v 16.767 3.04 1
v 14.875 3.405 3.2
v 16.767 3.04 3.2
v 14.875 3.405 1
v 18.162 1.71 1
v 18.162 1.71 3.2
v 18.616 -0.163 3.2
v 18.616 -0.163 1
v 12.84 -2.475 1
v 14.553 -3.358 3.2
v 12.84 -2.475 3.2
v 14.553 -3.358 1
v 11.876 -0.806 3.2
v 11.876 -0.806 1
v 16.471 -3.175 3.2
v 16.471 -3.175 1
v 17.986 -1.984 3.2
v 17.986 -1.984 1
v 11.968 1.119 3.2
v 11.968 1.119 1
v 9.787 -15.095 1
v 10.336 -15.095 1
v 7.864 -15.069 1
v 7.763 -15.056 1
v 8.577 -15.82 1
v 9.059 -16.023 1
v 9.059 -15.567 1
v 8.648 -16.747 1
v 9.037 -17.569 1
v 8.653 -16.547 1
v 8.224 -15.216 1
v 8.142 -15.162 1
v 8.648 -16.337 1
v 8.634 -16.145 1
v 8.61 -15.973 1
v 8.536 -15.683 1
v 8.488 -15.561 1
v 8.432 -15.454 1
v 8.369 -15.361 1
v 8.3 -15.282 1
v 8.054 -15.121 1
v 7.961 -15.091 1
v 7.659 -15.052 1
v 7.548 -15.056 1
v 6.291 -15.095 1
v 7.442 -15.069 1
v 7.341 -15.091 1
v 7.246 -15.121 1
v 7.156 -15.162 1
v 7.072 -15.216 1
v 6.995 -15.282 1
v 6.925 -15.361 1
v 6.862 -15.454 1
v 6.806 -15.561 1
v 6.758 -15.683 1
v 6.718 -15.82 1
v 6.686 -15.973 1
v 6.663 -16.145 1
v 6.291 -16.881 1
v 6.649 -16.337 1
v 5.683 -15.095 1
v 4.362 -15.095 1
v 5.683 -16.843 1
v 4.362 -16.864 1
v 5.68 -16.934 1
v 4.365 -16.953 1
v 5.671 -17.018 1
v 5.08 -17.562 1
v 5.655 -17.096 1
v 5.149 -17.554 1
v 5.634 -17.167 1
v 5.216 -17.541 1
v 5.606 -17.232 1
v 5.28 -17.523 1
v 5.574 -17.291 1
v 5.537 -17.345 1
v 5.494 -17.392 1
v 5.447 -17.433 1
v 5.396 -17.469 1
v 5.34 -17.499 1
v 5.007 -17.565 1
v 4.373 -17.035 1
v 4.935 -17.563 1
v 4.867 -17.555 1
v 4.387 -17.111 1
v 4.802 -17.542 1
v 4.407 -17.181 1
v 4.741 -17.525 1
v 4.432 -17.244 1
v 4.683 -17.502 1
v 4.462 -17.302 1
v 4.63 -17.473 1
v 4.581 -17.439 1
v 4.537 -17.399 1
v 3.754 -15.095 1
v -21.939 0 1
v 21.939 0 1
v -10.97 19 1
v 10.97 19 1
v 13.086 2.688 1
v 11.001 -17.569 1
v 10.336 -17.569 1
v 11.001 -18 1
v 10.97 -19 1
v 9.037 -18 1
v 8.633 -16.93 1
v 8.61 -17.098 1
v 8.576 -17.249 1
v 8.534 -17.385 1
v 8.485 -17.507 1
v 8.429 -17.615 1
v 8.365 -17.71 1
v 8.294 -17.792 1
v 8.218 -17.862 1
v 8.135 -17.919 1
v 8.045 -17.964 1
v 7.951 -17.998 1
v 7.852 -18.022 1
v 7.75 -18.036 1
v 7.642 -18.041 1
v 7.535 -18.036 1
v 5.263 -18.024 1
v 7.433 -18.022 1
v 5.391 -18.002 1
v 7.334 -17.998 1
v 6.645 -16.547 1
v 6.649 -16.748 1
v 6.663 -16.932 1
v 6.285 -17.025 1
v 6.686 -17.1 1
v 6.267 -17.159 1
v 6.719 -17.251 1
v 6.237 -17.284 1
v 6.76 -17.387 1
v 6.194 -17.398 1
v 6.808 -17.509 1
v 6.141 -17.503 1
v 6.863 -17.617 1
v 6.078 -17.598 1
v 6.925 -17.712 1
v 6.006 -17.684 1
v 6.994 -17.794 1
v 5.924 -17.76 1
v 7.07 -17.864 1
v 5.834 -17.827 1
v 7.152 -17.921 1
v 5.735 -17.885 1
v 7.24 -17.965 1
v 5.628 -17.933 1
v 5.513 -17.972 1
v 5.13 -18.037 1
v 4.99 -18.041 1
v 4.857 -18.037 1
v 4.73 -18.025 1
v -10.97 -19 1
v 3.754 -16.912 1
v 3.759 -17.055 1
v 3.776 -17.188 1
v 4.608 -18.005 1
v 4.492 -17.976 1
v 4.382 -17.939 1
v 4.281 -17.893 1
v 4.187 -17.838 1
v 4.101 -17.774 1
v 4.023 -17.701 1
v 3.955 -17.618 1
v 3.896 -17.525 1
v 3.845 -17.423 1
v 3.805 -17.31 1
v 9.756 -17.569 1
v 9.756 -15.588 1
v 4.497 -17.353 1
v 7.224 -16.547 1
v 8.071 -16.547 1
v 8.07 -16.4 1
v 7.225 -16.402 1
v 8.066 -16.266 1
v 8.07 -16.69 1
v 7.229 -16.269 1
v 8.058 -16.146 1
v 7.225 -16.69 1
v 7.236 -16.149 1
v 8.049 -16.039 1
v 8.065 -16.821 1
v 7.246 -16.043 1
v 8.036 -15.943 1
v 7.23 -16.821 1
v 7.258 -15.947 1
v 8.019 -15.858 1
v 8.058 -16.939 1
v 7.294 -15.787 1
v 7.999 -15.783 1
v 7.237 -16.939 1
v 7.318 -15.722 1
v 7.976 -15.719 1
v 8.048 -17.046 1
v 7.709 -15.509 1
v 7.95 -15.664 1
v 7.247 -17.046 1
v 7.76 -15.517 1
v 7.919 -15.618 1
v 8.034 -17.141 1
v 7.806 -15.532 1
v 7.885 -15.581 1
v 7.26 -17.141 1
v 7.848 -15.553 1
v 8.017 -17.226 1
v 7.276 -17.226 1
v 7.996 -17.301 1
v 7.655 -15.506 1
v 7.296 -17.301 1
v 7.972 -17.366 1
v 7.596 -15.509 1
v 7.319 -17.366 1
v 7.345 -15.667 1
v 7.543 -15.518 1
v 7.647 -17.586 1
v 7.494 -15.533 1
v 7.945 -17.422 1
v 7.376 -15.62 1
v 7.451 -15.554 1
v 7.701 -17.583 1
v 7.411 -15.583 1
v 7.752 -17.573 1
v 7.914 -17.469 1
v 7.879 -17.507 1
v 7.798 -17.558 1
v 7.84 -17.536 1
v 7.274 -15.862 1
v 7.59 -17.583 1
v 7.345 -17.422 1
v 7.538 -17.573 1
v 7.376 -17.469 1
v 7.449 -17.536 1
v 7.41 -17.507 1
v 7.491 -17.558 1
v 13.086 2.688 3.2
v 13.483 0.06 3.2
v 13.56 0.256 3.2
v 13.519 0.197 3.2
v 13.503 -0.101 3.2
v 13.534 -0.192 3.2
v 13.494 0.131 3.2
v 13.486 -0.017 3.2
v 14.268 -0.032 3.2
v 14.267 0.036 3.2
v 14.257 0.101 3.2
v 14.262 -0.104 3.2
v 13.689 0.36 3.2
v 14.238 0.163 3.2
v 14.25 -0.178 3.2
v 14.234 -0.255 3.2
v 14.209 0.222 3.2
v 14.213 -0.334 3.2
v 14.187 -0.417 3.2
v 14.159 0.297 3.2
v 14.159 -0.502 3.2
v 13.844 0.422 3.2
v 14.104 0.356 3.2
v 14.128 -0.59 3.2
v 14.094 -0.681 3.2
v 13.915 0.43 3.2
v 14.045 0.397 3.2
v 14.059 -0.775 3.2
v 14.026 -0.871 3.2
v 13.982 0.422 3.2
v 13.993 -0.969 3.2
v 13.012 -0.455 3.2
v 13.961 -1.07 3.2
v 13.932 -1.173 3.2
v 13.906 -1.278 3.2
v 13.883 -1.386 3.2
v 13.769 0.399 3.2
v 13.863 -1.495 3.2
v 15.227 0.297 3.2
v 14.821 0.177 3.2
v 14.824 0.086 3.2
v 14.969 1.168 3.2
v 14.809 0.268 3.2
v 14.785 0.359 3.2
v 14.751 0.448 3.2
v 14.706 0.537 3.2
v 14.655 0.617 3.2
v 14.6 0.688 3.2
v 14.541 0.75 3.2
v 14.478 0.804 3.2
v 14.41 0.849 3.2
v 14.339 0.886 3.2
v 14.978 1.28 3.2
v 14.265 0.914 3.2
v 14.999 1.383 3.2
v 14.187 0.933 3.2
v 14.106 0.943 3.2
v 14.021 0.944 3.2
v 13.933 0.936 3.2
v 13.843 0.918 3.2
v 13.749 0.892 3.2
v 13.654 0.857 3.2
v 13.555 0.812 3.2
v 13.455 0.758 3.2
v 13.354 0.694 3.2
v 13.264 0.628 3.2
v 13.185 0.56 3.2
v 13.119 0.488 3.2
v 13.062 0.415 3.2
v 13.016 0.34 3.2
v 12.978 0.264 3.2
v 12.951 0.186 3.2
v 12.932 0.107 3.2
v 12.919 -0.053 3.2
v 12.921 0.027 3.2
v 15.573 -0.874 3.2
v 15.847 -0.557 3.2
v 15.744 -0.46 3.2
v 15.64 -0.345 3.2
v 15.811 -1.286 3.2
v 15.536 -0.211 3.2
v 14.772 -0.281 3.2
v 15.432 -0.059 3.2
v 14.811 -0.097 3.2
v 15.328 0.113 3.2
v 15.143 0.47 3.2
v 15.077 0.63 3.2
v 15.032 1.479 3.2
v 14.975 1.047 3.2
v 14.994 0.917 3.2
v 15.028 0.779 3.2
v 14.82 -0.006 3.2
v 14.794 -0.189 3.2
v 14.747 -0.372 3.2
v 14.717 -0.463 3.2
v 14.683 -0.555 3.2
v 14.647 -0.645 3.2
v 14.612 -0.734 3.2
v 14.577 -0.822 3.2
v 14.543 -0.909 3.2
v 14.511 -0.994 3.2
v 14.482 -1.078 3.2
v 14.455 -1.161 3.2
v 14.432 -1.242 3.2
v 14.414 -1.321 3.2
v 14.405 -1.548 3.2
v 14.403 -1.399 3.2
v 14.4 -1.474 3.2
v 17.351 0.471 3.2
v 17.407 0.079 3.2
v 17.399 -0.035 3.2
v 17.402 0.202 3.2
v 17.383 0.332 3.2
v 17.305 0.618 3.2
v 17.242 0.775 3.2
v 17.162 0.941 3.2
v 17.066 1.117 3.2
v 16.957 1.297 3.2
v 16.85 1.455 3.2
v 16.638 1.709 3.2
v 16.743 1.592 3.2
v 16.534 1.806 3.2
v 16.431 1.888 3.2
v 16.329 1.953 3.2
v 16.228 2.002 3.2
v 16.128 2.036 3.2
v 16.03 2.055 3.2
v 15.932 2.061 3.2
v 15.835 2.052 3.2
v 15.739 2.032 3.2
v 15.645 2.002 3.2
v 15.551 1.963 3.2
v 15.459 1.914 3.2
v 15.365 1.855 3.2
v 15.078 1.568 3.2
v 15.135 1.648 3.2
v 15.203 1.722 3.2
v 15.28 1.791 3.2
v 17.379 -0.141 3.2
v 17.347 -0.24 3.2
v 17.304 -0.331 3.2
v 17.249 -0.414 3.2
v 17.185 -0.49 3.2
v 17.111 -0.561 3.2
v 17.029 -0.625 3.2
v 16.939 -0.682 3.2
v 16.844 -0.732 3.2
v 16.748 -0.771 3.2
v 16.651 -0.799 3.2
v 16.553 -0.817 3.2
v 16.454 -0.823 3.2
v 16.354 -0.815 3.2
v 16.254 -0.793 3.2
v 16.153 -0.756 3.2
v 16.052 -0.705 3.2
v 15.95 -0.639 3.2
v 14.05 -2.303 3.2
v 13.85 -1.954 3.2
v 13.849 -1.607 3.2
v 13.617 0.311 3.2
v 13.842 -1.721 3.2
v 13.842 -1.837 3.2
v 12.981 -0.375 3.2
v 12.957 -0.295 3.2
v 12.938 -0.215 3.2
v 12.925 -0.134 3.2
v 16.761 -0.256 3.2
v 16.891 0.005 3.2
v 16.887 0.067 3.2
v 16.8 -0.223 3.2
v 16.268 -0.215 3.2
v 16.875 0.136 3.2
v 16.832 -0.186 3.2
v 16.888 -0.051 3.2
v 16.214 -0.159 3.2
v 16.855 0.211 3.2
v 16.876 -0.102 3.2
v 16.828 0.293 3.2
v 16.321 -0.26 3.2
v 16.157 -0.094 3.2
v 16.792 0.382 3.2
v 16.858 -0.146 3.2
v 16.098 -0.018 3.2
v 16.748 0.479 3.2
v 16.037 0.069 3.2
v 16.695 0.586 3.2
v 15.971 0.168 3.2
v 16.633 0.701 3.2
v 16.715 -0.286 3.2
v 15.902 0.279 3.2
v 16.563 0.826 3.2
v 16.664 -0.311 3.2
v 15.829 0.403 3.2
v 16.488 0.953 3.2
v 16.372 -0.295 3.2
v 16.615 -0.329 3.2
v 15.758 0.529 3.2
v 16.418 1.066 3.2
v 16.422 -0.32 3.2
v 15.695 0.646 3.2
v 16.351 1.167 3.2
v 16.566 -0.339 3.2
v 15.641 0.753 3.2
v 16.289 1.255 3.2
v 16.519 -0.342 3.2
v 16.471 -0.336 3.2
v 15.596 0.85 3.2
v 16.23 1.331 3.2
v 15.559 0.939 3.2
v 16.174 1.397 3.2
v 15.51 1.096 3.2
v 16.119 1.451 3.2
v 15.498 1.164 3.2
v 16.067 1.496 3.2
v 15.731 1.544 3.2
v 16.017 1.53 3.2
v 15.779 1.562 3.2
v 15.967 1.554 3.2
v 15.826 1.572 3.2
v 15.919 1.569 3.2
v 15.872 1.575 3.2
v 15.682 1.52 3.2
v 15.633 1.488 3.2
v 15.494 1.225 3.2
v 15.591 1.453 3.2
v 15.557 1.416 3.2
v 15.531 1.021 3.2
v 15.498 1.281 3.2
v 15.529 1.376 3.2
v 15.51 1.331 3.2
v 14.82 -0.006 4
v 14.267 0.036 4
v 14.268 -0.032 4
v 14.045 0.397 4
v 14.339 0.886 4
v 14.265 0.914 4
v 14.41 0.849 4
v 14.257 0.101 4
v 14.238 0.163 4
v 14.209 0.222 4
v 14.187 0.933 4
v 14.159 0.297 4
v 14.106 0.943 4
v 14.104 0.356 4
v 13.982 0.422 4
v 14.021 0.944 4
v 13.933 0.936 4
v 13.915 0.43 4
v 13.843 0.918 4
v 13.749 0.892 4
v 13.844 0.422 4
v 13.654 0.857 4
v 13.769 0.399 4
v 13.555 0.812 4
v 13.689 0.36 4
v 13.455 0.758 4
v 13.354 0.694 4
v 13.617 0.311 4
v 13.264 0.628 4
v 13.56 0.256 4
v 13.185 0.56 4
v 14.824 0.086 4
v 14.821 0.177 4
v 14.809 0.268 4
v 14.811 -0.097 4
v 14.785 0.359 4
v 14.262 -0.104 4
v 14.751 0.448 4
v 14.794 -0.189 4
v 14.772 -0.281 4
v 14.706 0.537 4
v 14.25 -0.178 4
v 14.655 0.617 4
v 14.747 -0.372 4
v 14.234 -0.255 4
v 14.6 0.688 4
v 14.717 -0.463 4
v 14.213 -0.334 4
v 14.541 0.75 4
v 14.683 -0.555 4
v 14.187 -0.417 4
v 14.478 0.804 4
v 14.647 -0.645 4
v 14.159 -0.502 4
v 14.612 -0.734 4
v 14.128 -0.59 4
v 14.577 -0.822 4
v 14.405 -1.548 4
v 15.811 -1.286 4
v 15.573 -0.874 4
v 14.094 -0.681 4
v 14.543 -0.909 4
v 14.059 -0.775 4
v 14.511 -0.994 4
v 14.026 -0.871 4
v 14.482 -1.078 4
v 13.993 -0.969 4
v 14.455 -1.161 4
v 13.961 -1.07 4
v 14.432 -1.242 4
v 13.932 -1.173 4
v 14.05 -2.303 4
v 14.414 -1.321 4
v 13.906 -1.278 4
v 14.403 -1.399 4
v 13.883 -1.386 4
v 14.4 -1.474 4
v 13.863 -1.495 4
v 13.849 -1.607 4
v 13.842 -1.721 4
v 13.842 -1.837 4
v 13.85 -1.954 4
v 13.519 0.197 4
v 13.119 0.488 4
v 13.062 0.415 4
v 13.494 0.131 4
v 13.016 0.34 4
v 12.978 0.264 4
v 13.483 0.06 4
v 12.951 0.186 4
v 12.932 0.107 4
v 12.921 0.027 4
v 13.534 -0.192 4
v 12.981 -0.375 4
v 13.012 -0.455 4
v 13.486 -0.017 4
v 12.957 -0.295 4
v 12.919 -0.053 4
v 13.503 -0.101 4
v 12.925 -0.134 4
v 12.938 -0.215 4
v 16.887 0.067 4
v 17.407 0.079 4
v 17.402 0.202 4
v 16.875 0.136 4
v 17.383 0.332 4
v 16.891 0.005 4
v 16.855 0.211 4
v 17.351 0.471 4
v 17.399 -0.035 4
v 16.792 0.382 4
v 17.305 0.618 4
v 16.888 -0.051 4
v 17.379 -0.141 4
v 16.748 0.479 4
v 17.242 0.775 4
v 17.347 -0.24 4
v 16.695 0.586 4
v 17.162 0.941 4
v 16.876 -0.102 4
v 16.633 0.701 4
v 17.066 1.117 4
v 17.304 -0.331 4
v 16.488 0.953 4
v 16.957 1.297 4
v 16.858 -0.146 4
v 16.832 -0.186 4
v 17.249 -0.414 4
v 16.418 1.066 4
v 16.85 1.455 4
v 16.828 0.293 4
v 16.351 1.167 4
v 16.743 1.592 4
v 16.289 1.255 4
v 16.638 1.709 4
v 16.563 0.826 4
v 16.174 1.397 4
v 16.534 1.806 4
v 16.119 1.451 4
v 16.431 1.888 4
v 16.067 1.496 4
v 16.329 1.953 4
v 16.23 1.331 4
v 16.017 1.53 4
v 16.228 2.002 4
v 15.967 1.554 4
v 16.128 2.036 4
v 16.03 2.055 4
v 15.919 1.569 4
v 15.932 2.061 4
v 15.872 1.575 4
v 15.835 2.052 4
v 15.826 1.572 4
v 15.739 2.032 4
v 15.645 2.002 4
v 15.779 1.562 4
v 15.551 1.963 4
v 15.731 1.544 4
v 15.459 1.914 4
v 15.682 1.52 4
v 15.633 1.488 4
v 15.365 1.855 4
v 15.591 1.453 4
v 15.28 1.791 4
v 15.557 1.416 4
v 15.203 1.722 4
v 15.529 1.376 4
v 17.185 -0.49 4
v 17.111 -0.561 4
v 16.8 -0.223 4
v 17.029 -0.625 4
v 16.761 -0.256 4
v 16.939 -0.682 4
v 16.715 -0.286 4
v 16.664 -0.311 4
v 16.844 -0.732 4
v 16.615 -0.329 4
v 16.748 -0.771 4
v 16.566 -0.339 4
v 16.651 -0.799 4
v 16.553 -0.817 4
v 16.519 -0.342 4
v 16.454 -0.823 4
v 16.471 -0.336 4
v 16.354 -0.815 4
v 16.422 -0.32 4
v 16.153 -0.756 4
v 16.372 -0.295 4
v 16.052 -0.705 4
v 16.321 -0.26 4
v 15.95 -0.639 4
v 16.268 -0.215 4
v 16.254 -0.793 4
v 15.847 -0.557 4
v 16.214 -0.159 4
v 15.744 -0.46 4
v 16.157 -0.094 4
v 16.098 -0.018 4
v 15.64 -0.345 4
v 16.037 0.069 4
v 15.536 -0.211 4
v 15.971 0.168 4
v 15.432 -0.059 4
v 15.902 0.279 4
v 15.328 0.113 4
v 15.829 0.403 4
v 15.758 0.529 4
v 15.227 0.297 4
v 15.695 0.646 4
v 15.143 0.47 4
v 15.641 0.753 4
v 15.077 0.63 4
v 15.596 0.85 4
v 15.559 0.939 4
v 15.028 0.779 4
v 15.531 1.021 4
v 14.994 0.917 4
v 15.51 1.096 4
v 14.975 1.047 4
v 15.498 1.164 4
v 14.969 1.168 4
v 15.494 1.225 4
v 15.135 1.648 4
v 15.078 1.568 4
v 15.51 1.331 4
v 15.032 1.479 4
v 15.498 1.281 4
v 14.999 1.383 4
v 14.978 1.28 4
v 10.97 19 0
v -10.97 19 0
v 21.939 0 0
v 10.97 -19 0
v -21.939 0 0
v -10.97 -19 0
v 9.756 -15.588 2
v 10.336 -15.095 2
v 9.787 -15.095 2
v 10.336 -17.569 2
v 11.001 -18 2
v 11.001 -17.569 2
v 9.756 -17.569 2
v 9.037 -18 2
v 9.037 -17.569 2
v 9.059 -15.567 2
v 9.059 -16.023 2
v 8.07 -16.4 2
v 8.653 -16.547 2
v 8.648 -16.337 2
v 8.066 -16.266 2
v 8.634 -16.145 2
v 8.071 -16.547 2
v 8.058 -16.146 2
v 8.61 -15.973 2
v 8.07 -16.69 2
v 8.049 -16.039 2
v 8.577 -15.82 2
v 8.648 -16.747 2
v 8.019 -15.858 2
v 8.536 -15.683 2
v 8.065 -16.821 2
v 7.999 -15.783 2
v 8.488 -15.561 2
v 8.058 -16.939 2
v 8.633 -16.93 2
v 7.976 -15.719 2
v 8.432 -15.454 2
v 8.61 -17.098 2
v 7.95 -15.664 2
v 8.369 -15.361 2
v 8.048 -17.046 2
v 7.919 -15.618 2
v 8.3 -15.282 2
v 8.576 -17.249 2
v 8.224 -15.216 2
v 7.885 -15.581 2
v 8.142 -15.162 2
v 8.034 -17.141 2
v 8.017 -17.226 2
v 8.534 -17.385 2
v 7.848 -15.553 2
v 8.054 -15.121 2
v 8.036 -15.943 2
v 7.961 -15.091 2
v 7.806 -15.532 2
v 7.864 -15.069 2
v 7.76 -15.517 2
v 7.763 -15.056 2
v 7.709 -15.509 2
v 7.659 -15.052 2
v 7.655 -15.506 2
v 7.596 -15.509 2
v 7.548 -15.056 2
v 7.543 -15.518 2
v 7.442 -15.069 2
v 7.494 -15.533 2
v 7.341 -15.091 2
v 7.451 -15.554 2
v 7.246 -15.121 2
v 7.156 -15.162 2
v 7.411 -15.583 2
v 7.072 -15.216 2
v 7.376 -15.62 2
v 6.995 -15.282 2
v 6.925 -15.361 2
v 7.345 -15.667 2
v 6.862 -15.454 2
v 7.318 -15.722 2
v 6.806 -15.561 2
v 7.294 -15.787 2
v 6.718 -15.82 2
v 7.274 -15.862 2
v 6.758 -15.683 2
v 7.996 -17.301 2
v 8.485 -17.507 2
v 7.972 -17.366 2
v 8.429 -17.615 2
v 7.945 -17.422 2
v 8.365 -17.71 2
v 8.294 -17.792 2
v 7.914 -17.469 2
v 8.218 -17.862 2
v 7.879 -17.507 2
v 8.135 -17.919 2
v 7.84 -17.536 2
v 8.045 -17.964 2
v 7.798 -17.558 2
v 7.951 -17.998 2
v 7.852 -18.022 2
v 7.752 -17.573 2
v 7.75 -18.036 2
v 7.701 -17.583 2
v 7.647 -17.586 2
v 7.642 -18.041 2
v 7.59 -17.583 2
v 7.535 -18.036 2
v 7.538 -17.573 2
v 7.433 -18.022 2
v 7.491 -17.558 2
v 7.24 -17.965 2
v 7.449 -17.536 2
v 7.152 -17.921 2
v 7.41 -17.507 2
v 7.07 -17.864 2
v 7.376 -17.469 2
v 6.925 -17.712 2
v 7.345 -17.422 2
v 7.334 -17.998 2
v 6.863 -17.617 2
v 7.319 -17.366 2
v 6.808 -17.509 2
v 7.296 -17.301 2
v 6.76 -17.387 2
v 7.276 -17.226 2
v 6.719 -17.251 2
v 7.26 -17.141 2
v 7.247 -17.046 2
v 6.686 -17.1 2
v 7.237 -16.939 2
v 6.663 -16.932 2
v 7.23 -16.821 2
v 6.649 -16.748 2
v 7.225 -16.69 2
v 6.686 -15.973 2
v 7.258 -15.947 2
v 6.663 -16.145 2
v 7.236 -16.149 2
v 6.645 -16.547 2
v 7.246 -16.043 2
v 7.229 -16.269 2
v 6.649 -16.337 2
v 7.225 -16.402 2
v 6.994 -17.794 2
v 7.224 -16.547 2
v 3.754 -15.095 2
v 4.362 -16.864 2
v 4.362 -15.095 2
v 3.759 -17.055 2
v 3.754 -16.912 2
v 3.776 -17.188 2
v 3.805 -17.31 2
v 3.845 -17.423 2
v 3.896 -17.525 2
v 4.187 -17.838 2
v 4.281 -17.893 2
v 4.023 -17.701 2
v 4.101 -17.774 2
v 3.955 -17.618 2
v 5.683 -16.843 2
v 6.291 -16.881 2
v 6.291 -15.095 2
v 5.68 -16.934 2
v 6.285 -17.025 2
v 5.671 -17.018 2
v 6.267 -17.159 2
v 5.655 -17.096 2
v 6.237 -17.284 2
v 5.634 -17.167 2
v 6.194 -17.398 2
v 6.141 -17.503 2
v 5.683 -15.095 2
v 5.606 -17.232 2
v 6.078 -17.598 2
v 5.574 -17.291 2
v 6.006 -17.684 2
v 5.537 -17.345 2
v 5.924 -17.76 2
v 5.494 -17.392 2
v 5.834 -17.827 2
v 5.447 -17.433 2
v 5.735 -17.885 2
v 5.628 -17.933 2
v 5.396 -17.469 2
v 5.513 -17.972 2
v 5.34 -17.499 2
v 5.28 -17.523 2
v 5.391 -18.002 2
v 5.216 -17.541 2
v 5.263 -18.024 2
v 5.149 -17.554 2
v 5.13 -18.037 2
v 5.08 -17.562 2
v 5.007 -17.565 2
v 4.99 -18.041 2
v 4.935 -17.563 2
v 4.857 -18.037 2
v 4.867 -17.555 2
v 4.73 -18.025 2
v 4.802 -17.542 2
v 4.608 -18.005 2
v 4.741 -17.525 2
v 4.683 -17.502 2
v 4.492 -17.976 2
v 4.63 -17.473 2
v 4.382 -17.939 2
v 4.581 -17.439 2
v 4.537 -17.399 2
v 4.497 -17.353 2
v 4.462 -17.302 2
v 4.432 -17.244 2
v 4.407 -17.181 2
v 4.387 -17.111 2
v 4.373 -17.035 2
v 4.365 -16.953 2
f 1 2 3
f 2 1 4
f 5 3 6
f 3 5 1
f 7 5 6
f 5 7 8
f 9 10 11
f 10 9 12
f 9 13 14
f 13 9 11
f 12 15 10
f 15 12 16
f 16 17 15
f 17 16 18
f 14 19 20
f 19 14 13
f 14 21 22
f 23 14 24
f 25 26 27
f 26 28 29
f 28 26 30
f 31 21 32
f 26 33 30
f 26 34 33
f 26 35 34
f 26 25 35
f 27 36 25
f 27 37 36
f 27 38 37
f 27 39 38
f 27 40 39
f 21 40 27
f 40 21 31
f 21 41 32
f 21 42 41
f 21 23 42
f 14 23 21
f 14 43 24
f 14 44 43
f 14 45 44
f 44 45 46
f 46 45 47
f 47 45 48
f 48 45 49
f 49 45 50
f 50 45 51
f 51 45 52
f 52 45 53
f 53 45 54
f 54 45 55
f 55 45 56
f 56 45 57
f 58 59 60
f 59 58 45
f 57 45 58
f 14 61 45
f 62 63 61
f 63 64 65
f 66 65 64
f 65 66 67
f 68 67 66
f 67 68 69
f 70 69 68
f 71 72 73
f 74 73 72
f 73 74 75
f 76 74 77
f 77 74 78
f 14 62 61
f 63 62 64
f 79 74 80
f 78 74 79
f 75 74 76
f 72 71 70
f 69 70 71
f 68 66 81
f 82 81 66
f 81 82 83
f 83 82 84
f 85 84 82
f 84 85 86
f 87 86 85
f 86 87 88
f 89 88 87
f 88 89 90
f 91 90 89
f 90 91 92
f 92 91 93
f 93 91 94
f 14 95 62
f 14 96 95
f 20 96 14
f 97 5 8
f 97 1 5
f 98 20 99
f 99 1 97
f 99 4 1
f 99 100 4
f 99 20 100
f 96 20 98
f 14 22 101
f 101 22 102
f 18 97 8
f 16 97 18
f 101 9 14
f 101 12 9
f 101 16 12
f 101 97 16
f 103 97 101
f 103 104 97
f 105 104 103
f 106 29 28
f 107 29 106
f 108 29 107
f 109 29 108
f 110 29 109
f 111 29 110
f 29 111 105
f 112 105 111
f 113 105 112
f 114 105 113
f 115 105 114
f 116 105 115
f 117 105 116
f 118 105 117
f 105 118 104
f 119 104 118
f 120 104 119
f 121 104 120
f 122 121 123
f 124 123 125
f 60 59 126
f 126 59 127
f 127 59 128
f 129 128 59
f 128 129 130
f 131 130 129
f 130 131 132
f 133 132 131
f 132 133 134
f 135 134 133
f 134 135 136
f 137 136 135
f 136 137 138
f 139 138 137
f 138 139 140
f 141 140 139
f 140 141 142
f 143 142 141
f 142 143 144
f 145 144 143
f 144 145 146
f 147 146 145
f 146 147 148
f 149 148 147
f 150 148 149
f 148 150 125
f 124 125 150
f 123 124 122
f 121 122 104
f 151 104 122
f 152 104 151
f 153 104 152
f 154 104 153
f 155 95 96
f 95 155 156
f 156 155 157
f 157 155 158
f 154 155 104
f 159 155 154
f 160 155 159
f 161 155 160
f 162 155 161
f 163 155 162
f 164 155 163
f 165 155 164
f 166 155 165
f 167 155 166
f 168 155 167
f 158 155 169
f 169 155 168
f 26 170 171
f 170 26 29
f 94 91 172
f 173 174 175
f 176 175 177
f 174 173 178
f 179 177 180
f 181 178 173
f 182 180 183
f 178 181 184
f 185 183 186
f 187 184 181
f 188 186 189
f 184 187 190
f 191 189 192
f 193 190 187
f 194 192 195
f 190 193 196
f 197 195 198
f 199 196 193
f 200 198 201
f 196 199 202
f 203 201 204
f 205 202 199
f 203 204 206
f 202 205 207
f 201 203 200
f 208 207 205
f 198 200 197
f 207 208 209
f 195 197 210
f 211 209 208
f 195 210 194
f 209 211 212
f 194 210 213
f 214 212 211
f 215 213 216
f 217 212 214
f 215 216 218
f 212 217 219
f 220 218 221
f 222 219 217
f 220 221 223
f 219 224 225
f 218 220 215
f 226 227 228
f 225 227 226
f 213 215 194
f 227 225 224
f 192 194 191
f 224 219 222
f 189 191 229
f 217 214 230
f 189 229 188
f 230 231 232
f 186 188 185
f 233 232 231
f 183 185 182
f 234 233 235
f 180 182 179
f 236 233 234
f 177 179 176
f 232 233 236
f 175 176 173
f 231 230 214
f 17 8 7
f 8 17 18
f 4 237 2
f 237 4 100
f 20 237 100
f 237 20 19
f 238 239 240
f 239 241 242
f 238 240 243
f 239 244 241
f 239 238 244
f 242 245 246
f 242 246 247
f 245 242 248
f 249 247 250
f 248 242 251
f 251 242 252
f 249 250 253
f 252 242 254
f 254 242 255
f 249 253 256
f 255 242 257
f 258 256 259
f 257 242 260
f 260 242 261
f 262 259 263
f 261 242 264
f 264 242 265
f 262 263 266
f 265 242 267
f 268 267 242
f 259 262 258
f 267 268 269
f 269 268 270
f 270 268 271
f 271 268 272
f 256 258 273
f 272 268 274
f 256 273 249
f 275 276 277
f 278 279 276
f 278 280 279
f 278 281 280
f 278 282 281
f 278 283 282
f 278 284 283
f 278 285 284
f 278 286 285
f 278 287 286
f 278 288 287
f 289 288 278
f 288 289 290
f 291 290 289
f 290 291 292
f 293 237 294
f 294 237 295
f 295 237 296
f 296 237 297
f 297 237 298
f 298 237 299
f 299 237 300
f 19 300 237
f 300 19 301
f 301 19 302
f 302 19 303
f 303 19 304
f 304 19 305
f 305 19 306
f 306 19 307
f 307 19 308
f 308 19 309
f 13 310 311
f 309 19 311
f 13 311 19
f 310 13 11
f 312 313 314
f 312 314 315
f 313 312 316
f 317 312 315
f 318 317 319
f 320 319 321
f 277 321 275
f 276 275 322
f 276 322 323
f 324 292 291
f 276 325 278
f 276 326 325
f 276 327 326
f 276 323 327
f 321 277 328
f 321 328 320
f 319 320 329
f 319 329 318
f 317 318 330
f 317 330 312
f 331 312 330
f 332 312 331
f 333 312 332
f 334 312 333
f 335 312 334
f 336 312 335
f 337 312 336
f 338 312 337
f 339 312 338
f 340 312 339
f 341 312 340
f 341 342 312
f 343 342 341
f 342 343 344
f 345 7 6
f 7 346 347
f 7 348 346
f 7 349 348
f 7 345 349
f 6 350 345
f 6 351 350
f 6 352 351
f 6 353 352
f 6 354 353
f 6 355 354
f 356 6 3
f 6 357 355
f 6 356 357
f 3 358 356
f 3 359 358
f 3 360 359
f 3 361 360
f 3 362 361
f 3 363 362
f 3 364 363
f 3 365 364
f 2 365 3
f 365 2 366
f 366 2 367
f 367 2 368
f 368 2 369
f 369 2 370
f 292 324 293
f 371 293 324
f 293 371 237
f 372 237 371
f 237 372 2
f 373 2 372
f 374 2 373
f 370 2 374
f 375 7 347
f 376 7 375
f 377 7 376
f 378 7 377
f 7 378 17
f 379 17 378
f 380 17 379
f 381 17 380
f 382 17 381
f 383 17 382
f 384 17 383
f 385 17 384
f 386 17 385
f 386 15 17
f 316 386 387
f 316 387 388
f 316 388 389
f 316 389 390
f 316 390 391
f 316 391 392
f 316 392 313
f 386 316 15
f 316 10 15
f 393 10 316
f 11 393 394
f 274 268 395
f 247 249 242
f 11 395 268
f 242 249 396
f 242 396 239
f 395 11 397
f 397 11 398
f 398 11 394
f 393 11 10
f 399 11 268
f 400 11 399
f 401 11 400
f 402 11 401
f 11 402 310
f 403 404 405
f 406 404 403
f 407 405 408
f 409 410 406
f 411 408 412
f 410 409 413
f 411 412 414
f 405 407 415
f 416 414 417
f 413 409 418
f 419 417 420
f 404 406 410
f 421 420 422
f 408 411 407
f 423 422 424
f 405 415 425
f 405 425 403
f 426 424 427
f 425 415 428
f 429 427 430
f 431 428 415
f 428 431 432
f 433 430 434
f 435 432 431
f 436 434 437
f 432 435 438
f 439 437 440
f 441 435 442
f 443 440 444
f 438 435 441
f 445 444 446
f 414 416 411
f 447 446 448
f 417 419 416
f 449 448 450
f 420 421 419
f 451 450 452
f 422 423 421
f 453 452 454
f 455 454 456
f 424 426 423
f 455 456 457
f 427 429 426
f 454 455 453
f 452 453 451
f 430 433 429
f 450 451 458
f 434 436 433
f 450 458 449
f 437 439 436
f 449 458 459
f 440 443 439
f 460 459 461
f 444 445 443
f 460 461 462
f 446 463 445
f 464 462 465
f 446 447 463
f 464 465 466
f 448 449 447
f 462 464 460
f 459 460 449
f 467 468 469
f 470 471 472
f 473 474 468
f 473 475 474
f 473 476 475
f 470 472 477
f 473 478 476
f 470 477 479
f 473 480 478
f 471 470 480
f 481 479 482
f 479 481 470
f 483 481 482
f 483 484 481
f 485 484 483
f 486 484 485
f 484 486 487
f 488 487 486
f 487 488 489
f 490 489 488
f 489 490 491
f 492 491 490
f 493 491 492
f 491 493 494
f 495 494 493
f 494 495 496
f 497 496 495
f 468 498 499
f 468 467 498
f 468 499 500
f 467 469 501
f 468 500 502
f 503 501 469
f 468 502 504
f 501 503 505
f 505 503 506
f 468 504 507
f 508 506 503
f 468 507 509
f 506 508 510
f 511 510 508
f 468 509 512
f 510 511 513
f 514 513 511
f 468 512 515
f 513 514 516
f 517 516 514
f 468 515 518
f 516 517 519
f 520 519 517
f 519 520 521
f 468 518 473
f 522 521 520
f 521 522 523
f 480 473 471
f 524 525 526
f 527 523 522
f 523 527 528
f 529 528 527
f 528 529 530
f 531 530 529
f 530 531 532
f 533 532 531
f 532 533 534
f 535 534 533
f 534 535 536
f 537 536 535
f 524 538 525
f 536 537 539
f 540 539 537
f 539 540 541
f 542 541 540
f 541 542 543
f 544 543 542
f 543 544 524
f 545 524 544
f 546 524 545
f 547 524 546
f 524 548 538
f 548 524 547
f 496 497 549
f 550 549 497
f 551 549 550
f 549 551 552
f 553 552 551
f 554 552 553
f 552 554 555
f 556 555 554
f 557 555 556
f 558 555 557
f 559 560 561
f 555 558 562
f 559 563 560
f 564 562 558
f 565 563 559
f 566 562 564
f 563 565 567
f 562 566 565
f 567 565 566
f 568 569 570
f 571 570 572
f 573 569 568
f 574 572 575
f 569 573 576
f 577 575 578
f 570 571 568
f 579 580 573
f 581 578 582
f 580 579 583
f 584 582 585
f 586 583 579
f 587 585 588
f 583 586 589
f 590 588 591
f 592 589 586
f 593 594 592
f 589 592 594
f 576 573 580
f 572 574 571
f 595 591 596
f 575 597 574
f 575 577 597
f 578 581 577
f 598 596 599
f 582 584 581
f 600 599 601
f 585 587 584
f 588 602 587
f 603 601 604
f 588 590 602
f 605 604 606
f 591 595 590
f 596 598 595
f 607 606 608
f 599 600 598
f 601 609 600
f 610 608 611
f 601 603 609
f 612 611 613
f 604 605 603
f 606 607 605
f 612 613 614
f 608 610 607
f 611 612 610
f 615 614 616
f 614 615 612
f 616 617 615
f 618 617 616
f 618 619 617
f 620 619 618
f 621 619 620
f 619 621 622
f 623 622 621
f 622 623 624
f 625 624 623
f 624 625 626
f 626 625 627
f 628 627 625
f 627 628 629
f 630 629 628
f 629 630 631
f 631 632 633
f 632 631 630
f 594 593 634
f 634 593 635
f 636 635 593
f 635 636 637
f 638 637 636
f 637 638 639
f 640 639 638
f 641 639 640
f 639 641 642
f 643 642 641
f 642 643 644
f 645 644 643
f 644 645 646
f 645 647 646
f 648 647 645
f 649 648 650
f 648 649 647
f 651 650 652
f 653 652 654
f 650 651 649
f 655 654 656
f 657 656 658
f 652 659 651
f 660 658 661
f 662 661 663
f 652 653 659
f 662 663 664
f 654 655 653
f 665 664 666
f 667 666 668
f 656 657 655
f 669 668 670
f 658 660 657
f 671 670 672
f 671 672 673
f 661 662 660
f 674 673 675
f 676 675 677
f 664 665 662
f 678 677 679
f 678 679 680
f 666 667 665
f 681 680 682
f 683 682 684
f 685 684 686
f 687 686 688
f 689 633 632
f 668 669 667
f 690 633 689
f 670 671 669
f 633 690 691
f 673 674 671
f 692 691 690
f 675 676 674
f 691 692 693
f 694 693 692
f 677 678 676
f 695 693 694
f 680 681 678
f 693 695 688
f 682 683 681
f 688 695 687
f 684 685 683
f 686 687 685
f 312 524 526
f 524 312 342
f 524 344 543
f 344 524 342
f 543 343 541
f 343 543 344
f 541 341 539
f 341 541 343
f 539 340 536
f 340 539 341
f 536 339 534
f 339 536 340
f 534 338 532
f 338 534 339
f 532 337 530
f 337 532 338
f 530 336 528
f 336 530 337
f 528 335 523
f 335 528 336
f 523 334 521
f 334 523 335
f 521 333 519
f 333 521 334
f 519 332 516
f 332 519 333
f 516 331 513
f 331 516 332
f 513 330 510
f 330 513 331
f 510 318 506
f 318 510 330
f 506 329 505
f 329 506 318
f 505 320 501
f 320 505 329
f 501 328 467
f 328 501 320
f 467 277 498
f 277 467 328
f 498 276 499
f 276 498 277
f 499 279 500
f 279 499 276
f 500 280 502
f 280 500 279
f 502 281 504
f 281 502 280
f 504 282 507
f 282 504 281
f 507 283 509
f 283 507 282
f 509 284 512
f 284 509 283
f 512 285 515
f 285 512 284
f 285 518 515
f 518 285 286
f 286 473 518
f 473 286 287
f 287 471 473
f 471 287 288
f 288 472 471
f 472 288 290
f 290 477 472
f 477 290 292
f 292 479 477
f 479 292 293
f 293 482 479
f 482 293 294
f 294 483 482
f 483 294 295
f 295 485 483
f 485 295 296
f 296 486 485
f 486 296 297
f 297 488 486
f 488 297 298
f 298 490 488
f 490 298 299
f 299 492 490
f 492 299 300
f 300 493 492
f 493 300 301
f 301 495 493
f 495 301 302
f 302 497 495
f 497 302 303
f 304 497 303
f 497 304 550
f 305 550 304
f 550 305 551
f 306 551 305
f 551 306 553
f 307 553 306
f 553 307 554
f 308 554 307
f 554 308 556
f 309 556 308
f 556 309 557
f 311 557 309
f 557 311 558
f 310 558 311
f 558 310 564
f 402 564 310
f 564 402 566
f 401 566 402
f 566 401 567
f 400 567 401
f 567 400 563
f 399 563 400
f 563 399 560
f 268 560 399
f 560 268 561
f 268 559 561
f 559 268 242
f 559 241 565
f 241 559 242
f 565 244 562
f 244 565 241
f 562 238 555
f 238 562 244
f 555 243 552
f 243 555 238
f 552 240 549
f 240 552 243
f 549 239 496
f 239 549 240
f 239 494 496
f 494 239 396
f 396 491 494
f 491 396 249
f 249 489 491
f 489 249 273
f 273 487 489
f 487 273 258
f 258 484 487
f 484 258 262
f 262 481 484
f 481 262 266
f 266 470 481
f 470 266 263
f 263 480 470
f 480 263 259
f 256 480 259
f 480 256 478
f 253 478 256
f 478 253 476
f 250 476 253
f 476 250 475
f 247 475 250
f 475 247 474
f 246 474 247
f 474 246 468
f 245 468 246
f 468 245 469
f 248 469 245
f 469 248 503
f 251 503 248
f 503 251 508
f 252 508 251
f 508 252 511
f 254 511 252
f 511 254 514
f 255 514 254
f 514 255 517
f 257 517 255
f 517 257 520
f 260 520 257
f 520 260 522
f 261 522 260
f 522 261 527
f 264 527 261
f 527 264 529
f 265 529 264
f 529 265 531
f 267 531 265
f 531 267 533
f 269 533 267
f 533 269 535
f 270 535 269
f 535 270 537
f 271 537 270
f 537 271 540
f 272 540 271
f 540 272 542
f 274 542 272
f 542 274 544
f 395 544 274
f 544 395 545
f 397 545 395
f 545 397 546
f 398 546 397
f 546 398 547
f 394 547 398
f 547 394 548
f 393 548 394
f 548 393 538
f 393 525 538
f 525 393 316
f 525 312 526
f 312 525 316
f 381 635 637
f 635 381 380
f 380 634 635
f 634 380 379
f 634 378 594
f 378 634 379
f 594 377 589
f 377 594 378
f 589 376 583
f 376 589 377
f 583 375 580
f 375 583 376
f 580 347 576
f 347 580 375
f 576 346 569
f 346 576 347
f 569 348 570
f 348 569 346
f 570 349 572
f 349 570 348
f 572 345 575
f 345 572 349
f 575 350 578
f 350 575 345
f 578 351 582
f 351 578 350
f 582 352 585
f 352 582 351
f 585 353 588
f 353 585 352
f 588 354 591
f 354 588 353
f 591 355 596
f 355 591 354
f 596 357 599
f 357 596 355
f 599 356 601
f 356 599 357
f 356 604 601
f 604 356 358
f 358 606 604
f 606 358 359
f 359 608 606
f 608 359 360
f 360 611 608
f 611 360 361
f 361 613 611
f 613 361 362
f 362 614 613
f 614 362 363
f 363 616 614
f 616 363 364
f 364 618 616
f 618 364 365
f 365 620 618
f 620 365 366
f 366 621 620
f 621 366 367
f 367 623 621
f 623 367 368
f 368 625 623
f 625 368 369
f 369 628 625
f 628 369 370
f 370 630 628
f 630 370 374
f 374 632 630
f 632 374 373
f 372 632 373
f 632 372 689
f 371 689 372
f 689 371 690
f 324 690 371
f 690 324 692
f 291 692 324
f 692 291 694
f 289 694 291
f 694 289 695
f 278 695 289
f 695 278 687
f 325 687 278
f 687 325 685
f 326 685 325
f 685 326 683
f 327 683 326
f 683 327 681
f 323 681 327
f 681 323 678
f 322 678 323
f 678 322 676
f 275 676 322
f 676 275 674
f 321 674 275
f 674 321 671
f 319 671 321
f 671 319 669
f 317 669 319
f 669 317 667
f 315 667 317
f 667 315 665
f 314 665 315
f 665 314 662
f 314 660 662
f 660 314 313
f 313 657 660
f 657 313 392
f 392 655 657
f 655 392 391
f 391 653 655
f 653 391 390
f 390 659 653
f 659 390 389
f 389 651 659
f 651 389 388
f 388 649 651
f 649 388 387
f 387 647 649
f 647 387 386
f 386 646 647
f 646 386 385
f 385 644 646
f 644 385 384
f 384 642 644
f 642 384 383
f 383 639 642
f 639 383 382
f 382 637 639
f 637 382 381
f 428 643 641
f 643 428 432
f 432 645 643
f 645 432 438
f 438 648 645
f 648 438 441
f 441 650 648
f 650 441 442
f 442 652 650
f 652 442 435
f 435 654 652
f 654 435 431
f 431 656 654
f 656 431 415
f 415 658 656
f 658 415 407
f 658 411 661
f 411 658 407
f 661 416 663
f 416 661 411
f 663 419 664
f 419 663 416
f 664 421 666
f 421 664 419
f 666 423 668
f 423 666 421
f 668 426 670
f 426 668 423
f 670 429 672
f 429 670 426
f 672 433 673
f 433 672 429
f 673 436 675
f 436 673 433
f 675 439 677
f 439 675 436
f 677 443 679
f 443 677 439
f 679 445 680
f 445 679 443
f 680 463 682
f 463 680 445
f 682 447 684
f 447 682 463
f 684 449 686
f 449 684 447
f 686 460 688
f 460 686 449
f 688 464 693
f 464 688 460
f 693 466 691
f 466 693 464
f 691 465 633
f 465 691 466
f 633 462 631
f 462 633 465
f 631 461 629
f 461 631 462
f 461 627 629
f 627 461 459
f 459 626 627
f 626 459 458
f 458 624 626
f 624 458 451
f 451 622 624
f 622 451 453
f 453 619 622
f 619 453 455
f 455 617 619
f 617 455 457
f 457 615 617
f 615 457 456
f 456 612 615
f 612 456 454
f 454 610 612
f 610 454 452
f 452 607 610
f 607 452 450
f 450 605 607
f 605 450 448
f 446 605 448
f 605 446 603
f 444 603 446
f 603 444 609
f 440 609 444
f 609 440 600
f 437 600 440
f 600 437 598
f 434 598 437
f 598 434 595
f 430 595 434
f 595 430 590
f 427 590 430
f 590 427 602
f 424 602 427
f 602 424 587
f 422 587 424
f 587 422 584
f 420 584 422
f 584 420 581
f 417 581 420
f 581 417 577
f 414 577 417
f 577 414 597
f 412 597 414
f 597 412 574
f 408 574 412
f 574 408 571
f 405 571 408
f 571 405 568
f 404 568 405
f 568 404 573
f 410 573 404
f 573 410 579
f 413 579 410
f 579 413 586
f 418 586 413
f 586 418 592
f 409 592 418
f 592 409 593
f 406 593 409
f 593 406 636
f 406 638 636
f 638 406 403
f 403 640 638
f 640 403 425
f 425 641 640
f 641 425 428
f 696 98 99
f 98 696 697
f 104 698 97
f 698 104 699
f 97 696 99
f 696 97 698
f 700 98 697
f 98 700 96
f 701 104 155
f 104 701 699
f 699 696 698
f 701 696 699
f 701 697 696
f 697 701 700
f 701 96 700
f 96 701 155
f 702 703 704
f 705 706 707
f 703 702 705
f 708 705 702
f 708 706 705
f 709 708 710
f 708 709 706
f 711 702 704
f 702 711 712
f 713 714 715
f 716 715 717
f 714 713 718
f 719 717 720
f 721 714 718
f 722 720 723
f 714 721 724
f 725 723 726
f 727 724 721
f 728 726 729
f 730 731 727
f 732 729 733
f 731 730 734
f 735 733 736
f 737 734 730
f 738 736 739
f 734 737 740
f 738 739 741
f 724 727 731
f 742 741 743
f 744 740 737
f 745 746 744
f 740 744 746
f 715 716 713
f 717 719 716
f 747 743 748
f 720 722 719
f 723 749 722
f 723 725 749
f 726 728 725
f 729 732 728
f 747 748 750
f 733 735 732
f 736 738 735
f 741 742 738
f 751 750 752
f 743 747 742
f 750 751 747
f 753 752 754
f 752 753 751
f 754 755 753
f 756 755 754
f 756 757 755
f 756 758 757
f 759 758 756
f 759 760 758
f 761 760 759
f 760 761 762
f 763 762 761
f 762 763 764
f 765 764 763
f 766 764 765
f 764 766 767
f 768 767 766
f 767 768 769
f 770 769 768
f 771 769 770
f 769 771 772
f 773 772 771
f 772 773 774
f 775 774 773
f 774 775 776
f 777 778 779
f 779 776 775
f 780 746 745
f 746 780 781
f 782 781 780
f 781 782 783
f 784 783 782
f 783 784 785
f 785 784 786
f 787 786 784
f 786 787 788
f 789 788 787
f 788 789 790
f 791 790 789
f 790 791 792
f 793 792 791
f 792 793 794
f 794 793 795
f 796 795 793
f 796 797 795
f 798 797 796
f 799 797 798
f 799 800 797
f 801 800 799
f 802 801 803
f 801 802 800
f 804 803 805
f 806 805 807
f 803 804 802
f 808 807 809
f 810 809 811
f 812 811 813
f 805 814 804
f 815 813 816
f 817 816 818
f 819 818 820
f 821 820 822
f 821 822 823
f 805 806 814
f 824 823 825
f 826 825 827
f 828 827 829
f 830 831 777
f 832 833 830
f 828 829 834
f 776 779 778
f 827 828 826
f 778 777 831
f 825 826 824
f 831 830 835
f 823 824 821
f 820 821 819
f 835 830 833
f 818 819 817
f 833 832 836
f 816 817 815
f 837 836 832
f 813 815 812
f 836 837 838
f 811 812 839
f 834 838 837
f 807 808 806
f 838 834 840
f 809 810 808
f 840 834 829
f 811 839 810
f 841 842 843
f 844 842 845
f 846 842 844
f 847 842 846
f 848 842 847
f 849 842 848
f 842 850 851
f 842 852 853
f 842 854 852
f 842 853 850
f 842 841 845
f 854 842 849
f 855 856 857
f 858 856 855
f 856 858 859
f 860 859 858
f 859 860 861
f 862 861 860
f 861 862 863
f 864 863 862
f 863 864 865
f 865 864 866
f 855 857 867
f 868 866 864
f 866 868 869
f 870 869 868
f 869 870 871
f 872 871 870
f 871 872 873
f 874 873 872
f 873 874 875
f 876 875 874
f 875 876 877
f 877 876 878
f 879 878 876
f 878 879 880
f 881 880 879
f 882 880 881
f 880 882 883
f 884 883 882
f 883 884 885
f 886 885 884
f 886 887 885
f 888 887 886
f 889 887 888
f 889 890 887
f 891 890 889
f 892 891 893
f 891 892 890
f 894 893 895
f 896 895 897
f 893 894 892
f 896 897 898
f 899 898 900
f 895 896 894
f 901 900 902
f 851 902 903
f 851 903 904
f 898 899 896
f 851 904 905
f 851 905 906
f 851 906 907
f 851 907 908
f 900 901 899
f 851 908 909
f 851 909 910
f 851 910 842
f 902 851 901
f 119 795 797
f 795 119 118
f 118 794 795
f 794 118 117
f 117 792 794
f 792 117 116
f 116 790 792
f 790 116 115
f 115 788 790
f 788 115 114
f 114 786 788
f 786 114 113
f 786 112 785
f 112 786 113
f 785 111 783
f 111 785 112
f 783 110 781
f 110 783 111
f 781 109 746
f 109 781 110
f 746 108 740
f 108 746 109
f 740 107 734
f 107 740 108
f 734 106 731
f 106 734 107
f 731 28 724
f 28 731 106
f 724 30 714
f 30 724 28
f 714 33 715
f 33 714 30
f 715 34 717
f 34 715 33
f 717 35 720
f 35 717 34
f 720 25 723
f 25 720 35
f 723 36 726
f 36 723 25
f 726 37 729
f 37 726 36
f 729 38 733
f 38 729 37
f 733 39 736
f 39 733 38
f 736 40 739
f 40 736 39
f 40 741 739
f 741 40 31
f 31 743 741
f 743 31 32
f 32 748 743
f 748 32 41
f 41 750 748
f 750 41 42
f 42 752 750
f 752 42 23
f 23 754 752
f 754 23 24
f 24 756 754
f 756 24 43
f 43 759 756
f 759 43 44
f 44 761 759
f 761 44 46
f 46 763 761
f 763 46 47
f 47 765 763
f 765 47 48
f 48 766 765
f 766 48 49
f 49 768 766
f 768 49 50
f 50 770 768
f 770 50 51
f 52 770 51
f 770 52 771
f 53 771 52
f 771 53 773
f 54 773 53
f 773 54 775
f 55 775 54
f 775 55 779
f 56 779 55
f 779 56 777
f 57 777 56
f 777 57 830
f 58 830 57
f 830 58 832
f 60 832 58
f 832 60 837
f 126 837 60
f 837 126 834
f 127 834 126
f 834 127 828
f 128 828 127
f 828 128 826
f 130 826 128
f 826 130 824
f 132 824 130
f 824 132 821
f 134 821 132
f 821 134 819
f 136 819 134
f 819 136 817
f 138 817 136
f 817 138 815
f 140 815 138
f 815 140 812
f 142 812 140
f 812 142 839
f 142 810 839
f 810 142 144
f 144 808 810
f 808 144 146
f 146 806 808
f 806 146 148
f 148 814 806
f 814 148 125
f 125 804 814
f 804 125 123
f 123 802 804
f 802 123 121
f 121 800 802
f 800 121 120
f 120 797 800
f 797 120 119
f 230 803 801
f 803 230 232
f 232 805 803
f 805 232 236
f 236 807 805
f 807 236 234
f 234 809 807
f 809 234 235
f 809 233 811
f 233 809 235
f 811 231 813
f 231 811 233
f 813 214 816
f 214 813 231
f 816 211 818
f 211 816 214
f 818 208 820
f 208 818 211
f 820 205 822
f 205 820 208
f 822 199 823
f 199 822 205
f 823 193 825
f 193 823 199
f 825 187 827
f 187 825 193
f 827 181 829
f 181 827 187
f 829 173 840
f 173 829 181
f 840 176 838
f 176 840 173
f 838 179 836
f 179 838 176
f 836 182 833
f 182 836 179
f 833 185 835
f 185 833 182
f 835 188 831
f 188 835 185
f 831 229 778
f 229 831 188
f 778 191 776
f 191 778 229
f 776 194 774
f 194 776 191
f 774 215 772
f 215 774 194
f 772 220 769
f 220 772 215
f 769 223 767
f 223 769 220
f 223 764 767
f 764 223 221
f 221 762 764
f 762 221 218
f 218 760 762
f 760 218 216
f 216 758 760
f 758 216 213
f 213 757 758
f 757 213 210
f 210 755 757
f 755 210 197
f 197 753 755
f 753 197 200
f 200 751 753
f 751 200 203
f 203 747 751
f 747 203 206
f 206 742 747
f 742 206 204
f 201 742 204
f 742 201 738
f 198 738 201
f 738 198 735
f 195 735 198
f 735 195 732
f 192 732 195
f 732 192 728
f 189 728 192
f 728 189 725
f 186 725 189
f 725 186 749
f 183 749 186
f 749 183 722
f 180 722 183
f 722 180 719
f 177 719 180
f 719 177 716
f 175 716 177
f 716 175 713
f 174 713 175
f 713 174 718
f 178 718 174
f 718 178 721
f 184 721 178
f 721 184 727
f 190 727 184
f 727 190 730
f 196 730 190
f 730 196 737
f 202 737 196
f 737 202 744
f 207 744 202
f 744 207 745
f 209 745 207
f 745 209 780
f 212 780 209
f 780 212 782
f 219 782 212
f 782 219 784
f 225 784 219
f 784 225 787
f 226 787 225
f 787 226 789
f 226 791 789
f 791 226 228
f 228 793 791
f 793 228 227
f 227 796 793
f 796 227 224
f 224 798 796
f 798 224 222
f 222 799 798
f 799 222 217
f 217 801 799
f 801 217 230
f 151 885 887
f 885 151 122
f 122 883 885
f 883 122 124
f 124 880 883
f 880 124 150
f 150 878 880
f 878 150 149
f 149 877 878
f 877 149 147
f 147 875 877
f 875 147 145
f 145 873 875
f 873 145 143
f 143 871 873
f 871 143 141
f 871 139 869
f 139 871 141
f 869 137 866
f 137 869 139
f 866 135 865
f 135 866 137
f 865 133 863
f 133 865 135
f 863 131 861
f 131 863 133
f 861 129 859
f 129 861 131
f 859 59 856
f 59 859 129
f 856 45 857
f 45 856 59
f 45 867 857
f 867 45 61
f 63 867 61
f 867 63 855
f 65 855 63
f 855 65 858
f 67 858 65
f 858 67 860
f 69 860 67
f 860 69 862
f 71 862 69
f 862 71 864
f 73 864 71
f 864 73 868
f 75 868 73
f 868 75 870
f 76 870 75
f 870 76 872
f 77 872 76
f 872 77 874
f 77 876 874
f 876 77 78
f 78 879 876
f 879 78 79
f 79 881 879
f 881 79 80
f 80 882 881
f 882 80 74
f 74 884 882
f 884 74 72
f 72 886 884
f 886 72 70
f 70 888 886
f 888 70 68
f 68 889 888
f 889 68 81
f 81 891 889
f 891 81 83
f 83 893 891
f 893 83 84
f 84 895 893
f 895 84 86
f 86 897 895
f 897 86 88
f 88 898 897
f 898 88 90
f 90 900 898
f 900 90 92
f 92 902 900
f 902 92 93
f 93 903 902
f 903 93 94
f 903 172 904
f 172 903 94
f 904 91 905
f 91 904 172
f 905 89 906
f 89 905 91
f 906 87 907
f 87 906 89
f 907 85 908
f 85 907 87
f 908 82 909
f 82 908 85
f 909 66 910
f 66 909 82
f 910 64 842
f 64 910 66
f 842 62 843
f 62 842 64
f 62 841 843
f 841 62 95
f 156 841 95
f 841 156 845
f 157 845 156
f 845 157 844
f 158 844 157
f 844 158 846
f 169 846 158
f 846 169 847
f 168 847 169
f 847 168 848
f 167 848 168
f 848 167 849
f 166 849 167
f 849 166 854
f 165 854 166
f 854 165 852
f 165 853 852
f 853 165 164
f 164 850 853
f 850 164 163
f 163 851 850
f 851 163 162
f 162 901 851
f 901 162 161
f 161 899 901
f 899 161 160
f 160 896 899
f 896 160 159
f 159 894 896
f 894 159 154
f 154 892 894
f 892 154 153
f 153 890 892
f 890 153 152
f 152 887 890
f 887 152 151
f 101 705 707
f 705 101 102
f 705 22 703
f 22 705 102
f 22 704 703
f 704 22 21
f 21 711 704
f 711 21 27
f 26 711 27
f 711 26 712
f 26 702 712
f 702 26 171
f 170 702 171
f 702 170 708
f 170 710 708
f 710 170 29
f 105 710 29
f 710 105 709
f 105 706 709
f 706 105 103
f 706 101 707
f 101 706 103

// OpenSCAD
include <../../Scripts/18xx tiles basic functions.scad>
hex("blue");
put_tilenr("U01");

put_value_blue("20",90);
